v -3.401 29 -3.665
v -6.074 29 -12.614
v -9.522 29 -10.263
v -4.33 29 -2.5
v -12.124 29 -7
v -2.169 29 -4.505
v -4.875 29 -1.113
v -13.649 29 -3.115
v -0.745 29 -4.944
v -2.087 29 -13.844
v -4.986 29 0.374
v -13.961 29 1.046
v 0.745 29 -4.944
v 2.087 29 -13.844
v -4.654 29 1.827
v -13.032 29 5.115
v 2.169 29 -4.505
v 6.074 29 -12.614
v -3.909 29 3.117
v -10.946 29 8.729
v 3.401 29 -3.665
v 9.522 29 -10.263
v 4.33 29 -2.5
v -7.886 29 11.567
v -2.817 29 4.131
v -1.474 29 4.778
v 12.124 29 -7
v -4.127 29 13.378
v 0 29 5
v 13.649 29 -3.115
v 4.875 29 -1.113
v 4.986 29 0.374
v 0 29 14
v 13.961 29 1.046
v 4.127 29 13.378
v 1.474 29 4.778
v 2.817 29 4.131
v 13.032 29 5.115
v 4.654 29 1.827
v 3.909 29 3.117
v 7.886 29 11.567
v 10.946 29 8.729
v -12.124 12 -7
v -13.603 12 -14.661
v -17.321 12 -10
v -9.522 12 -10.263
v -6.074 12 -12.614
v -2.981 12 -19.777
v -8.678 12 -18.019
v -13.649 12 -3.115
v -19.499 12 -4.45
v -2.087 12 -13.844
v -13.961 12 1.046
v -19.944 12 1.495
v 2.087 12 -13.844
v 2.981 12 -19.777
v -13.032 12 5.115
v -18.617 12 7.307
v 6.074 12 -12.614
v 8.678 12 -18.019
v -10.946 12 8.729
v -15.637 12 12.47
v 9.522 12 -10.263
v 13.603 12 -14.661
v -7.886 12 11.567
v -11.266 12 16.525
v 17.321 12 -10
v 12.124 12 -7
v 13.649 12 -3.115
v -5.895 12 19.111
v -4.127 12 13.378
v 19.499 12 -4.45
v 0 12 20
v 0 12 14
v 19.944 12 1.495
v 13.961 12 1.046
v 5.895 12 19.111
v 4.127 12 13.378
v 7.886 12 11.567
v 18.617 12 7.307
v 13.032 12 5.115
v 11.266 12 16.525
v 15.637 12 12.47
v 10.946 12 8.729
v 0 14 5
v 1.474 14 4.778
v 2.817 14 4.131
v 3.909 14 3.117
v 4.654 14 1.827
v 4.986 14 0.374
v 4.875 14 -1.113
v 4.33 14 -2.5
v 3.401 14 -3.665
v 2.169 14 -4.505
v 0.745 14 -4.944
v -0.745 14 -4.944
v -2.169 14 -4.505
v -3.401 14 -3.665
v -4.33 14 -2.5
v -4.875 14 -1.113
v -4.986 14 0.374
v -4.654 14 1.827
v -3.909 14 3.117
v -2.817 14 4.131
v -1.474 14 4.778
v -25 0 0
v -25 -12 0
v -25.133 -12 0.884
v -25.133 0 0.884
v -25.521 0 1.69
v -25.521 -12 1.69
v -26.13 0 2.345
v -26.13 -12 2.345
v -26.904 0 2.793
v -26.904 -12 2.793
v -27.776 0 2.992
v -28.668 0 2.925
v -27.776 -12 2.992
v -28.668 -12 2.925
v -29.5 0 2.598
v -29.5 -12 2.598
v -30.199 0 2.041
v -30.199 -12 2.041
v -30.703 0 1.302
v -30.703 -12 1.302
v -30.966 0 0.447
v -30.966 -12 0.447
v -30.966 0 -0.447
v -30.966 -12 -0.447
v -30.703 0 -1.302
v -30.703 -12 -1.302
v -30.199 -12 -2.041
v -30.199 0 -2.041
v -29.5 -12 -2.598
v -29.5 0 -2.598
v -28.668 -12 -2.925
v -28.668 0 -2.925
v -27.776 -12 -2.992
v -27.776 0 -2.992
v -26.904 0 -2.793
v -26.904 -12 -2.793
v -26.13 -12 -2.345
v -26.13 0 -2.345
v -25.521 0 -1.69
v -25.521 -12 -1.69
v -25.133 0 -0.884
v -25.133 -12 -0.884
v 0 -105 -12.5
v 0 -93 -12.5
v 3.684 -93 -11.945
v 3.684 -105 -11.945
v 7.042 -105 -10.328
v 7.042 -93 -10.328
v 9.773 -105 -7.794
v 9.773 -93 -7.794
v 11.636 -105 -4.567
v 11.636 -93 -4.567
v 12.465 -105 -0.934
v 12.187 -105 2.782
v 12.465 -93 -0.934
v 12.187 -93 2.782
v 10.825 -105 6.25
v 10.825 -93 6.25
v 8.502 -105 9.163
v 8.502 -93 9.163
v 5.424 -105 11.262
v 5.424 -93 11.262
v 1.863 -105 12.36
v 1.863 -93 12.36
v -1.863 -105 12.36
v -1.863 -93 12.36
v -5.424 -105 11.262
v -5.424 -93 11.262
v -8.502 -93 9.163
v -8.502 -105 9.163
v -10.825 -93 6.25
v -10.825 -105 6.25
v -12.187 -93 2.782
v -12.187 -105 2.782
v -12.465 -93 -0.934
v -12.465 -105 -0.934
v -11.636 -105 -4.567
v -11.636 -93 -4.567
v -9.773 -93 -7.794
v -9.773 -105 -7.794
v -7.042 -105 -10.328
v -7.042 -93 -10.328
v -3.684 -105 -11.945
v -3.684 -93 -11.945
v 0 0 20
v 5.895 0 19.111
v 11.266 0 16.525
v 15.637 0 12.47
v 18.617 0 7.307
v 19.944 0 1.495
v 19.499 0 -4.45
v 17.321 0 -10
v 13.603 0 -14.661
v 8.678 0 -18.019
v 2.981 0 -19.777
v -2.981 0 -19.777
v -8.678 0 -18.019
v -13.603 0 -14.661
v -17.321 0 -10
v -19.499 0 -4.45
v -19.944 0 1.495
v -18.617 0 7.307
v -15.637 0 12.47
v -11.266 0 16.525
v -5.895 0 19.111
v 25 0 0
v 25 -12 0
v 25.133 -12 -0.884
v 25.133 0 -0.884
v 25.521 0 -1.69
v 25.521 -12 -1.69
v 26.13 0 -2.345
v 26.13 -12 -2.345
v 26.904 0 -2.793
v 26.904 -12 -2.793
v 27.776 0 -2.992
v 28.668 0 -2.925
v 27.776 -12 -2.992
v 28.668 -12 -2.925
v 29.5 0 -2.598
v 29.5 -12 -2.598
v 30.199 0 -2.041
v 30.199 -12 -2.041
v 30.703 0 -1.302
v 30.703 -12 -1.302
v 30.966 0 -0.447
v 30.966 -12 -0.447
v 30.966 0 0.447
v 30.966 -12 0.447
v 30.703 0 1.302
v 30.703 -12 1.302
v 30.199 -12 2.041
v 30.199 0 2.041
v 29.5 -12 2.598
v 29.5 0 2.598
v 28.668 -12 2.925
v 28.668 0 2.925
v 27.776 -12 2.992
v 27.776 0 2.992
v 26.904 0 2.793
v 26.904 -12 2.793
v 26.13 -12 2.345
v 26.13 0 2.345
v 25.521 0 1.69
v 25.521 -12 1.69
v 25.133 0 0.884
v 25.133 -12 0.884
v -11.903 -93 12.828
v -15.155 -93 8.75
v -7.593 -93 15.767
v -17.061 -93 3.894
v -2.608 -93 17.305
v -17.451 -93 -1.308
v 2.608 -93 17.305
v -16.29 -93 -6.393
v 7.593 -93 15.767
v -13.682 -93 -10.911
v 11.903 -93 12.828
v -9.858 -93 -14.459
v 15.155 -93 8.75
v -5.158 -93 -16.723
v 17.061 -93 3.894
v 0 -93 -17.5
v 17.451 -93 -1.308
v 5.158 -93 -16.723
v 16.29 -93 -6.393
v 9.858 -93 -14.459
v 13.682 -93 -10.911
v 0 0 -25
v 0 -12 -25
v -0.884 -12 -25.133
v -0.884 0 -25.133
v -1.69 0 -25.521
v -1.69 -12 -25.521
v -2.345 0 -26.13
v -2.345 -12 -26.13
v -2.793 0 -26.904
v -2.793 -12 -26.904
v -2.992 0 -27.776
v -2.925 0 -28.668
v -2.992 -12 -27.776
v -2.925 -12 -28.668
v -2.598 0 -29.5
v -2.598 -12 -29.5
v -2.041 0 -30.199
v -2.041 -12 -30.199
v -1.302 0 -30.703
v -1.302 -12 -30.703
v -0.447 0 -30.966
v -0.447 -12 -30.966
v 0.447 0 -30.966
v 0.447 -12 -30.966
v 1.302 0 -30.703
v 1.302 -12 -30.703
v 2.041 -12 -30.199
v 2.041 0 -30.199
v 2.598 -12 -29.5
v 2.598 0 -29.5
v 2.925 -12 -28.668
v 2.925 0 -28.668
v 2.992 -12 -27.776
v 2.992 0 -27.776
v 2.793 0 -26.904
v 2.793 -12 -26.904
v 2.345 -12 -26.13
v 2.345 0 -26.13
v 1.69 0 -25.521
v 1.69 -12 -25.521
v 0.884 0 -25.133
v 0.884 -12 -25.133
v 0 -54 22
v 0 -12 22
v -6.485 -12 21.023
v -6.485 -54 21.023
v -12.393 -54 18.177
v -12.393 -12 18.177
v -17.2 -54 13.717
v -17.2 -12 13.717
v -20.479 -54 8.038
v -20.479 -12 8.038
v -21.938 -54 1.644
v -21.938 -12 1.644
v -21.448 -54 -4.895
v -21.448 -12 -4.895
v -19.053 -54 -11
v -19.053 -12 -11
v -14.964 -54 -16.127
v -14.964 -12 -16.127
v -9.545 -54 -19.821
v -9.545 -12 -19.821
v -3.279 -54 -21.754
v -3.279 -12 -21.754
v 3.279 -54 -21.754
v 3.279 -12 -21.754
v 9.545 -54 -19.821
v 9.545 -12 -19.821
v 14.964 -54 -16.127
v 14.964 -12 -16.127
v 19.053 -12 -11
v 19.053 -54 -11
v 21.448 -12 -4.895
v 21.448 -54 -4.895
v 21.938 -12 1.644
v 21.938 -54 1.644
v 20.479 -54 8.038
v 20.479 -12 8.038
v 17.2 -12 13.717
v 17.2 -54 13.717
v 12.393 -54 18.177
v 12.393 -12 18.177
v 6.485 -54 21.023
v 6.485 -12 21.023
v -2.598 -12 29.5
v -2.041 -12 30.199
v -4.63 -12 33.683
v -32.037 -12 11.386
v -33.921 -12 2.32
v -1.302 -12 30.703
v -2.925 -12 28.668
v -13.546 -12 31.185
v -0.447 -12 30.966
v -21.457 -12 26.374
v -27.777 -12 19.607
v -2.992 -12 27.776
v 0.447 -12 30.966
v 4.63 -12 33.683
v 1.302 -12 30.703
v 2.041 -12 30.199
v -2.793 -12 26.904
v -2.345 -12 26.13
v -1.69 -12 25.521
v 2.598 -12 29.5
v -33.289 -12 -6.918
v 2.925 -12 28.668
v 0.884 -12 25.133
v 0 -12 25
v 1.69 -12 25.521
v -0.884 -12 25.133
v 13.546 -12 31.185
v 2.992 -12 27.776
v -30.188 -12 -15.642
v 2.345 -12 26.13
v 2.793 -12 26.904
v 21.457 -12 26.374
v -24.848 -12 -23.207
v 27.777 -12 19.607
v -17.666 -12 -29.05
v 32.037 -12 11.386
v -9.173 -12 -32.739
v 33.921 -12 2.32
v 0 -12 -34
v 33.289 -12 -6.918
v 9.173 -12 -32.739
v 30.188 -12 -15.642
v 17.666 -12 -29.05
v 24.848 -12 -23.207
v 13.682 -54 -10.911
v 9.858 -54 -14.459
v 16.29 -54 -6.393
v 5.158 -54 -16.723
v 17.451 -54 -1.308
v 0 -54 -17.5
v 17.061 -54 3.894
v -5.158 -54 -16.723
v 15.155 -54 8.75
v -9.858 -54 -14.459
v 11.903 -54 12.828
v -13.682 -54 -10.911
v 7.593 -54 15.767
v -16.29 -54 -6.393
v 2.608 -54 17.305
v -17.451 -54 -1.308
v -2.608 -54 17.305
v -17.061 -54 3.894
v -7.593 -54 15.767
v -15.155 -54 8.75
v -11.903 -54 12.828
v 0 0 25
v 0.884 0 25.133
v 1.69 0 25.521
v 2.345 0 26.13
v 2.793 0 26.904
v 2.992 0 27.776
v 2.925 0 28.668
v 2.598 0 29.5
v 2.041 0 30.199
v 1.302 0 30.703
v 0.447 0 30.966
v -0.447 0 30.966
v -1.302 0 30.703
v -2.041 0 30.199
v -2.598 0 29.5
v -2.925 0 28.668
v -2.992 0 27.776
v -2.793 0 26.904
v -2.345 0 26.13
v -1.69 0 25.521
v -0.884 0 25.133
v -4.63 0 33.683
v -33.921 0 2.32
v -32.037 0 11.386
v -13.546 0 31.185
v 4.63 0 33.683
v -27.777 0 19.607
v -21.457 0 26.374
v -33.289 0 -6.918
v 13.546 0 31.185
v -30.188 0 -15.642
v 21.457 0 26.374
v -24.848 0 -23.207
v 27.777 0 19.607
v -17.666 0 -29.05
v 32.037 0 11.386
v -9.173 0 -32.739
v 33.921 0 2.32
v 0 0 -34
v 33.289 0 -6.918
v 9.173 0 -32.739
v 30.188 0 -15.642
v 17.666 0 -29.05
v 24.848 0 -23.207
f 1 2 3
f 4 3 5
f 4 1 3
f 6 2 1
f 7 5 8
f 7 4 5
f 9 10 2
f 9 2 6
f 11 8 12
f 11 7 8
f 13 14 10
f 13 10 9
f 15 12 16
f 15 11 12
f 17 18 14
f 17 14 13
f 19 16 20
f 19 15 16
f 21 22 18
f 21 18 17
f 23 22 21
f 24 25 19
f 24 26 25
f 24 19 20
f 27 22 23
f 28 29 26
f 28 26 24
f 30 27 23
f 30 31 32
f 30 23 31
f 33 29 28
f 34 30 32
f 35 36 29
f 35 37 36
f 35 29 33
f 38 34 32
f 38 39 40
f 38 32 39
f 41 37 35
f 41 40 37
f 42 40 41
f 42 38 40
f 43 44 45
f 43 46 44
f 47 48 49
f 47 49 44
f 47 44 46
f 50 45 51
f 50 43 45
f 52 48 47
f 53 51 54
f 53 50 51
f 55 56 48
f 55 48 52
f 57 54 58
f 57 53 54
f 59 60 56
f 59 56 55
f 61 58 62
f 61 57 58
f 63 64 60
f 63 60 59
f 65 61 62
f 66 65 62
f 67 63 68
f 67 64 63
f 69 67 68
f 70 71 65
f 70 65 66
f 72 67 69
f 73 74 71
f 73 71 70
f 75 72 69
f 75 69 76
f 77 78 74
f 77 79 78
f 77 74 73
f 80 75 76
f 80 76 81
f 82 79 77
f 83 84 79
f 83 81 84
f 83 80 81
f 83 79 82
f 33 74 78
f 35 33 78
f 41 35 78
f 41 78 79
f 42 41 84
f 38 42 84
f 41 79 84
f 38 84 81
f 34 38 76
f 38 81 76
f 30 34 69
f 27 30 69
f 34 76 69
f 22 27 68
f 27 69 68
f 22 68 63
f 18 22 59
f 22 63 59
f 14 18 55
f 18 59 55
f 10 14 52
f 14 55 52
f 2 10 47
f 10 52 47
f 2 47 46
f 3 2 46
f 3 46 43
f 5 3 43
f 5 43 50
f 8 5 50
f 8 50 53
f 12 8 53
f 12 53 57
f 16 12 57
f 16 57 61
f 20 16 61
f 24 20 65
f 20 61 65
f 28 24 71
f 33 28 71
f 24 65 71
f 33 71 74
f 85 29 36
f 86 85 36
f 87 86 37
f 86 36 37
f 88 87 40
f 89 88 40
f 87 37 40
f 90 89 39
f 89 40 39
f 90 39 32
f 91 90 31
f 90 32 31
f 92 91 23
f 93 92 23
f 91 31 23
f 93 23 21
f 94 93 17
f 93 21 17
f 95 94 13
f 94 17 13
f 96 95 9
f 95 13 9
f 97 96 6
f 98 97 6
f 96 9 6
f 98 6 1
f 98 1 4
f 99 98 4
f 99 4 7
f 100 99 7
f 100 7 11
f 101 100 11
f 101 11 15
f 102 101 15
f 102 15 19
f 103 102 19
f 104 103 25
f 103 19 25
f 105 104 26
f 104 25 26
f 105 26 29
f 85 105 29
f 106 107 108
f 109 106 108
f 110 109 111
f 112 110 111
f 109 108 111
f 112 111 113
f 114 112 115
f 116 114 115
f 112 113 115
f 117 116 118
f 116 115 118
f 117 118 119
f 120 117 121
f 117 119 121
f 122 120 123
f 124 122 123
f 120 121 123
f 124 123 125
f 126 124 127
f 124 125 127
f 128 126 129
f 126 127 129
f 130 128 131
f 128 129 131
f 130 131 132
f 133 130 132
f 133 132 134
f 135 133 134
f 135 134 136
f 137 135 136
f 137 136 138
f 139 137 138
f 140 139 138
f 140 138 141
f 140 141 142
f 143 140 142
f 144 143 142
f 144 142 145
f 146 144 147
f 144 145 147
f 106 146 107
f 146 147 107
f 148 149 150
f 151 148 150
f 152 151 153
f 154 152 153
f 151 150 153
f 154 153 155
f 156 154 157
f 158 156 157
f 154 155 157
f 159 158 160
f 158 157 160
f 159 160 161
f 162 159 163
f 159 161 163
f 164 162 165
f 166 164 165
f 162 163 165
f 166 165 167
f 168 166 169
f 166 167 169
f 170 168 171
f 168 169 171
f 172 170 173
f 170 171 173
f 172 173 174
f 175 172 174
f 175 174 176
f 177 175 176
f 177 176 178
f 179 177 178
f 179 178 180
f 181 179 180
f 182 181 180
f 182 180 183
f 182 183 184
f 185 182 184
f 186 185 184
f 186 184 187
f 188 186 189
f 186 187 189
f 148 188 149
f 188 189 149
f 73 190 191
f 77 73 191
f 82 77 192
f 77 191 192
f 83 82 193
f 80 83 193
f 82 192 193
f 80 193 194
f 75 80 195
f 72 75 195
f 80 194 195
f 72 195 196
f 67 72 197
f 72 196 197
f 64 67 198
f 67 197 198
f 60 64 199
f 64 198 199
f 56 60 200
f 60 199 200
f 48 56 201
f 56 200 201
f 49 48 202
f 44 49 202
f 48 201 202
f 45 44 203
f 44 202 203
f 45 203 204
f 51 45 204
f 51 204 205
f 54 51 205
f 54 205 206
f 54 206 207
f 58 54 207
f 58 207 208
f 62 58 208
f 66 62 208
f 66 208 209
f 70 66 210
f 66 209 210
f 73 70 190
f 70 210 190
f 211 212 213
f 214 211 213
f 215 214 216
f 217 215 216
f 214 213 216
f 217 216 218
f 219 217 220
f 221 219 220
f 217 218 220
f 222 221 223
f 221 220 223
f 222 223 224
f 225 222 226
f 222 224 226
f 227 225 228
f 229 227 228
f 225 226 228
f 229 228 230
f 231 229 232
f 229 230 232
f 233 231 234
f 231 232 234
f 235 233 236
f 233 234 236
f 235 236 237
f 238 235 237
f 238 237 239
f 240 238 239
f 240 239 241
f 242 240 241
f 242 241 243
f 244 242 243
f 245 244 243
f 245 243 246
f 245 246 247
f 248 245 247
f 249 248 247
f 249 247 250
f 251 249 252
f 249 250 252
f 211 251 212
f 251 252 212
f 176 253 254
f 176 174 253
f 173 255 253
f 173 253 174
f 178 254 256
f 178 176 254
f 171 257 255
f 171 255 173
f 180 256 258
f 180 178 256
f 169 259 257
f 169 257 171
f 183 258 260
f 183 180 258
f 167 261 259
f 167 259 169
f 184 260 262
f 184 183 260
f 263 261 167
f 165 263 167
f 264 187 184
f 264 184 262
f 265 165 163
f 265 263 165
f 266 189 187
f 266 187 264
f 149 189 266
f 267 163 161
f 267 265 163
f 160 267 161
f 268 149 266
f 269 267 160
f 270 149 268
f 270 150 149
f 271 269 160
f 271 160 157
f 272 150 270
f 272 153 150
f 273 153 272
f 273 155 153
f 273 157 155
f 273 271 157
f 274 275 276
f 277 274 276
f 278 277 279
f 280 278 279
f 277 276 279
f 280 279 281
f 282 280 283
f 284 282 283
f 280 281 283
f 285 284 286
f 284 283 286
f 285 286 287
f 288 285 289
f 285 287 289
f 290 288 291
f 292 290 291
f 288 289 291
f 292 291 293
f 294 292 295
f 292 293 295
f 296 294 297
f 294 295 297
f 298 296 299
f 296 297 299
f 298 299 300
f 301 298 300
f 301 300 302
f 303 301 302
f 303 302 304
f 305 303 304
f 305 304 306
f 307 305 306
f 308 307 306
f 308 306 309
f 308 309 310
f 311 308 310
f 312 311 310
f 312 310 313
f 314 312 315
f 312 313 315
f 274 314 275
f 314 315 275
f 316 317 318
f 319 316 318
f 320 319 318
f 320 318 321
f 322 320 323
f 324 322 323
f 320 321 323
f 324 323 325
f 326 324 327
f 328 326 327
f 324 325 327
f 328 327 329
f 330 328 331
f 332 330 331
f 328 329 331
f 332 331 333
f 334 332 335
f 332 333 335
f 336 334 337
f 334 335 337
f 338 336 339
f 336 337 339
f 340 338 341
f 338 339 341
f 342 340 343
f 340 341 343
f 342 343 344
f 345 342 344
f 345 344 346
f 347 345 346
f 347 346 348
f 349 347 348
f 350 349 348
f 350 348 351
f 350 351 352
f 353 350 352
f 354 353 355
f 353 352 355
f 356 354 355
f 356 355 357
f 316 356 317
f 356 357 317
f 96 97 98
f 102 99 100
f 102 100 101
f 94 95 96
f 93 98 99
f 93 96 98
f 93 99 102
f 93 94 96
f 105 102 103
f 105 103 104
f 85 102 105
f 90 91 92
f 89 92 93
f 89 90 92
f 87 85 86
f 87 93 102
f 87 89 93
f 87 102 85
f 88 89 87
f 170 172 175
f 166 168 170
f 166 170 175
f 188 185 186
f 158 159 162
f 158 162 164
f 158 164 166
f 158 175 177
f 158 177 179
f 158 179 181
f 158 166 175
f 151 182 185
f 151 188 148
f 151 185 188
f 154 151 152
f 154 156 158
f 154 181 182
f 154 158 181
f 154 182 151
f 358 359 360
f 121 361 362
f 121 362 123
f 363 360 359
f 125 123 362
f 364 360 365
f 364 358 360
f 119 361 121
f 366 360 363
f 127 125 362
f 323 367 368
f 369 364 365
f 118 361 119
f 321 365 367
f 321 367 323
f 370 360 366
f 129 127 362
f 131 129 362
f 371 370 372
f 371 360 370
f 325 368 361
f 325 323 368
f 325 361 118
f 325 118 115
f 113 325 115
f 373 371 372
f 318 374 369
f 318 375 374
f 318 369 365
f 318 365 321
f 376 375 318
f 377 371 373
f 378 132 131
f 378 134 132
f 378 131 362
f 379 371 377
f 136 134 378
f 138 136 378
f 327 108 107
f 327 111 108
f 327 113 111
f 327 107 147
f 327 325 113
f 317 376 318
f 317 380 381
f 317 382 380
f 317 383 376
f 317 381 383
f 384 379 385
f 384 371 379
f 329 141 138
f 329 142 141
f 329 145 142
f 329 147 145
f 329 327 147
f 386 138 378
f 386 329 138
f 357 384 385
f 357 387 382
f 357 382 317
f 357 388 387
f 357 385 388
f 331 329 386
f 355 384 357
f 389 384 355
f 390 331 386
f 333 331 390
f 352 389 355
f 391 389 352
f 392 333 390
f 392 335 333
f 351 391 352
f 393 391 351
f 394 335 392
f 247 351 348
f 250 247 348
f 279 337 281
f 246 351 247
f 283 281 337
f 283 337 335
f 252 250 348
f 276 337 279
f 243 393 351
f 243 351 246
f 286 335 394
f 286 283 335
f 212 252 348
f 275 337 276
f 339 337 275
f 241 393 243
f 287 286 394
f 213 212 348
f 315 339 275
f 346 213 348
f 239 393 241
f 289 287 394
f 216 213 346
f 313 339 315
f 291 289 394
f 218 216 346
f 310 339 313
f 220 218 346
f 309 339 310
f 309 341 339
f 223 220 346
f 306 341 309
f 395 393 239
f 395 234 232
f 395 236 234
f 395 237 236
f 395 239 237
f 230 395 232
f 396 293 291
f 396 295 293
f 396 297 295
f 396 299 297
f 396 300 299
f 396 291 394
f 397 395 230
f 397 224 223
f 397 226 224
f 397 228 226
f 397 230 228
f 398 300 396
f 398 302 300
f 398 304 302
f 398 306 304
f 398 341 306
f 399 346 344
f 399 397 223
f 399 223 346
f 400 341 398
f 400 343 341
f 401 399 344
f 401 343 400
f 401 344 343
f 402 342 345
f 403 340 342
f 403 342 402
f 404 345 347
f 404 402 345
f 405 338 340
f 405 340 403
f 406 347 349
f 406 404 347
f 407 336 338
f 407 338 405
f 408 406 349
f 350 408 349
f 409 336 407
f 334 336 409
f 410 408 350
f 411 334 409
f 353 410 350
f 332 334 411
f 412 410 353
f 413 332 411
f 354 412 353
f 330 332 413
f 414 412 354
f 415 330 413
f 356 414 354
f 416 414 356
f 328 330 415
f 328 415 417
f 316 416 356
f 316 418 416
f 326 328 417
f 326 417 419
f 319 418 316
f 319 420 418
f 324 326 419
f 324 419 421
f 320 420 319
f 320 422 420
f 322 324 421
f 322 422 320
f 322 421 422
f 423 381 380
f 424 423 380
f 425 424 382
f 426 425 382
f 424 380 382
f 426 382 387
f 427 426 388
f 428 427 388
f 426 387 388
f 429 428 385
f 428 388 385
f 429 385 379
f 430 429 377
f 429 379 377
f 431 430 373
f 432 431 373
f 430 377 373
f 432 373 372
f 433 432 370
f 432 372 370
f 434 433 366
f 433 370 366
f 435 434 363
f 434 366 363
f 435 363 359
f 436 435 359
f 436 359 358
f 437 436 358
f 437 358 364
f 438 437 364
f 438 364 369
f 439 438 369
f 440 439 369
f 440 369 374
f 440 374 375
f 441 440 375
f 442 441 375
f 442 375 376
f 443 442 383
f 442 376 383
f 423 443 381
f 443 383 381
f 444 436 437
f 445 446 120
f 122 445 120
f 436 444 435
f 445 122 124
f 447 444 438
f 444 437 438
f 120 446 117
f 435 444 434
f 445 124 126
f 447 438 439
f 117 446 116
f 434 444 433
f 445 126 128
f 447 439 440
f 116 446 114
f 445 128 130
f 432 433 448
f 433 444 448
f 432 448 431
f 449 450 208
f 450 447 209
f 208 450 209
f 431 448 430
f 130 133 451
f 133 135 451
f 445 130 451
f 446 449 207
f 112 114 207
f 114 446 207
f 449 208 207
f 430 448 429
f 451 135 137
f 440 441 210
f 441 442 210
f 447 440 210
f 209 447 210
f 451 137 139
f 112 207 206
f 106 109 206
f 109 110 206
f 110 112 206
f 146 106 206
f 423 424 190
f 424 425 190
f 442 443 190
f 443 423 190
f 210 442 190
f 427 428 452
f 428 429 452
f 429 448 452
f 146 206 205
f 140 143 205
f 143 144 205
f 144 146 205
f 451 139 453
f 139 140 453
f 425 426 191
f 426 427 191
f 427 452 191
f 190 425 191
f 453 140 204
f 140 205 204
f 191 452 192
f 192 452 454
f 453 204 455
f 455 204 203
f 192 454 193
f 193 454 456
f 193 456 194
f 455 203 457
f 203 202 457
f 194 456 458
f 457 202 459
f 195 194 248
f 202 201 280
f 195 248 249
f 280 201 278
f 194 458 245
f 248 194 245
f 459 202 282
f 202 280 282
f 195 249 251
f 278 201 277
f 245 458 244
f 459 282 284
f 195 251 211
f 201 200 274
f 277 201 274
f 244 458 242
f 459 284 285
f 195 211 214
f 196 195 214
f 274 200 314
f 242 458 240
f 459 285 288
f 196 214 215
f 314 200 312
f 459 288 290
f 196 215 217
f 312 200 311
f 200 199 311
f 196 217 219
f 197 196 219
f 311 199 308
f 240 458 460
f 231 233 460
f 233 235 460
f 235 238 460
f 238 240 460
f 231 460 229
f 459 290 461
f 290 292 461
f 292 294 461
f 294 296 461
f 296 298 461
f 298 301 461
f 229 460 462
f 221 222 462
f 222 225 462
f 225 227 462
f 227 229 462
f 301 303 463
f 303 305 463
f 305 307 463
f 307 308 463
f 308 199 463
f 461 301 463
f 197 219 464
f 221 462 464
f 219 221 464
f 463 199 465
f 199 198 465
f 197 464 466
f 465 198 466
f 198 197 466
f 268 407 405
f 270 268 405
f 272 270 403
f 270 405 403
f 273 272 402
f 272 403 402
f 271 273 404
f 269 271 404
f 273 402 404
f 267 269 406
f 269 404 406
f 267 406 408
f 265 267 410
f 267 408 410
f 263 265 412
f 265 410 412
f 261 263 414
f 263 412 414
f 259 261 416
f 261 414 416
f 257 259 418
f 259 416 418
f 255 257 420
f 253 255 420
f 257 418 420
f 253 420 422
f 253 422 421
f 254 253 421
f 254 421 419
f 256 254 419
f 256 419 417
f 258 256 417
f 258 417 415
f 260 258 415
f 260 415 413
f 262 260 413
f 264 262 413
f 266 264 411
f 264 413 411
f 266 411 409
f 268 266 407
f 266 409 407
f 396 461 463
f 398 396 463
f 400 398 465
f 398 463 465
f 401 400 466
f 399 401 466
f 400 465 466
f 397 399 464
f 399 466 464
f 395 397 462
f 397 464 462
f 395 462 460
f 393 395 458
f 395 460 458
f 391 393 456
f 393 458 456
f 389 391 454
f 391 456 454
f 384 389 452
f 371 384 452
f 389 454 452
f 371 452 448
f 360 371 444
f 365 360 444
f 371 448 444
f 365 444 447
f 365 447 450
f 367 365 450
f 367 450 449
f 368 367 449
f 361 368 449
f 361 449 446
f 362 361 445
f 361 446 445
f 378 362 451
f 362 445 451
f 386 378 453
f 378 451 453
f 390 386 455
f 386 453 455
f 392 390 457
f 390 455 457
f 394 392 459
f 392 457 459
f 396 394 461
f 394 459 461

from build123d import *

# Parameters (mm, degrees)
SKETCH_1_R               = 20
EXTRUDE_1_DEPTH          = 12
SKETCH_3_R               = 34
EXTRUDE_2_DEPTH          = 12
SKETCH_4_R               = 22
EXTRUDE_3_DEPTH          = 42
SKETCH_5_R               = 17.5
EXTRUDE_5_DEPTH          = 39
SKETCH_6_R               = 12.5
EXTRUDE_6_DEPTH          = 12
SKETCH_8_R               = 16
SKETCH_8_R_2             = 10
EXTRUDE_7_DEPTH          = 18
SKETCH_11_R              = 3
CUT_EXTRUDE_9_DEPTH      = 12
PATTERN_CIRCULAR_1_COUNT = 4
SKETCH_12_R              = 14
EXTRUDE_8_DEPTH          = 17
SKETCH_14_R              = 5
CUT_EXTRUDE_10_DEPTH     = 15


with BuildPart() as part:
    # 草图1 → 凸台-拉伸1 (new body)
    with BuildSketch(Plane(origin=(0, 0, 0), x_dir=(1, 0, 0), z_dir=(0, 1, 0))):
        with Locations(Location((0, 0, 0), (0, 0, 270))):
            Circle(SKETCH_1_R)
    extrude(amount=EXTRUDE_1_DEPTH)

    # 草图3 → 凸台-拉伸2 (add)
    with BuildSketch(Plane.XZ):
        with Locations(Location((0, 0, 0), (0, 0, 270))):
            Circle(SKETCH_3_R)
    extrude(amount=EXTRUDE_2_DEPTH)

    # 草图4 → 凸台-拉伸3 (add)
    with BuildSketch(Plane.XZ.offset(12)):
        with Locations(Location((0, 0, 0), (0, 0, 90))):
            Circle(SKETCH_4_R)
    extrude(amount=EXTRUDE_3_DEPTH)

    # 草图5 → 凸台-拉伸5 (add)
    with BuildSketch(Plane.XZ.offset(54)):
        with Locations(Location((0, 0, 0), (0, 0, 270))):
            Circle(SKETCH_5_R)
    extrude(amount=EXTRUDE_5_DEPTH)

    # 草图6 → 凸台-拉伸6 (add)
    with BuildSketch(Plane.XZ.offset(93)):
        with Locations(Location((0, 0, 0), (0, 0, 270))):
            Circle(SKETCH_6_R)
    extrude(amount=EXTRUDE_6_DEPTH)

    # 草图8 → 凸台-拉伸7 (add)
    with BuildSketch(Plane.XZ.offset(12)):
        Circle(SKETCH_8_R)
        Circle(SKETCH_8_R_2, mode=Mode.SUBTRACT)
    extrude(amount=EXTRUDE_7_DEPTH)

    # 草图11 → 切除-拉伸9 (cut)
    with BuildSketch(Plane.XZ.offset(12)):
        with Locations(Location((0, 28, 0), (0, 0, 270))):
            Circle(SKETCH_11_R)
    cut_extrude_9 = extrude(amount=-CUT_EXTRUDE_9_DEPTH, mode=Mode.SUBTRACT)

    # 阵列(圆周)1: 切除-拉伸9 ×4 about axis
    pattern_circular_1_axis = Axis((0, 0, 0), (0, 1, 0))
    for i in range(1, PATTERN_CIRCULAR_1_COUNT):
        add(cut_extrude_9.rotate(pattern_circular_1_axis, i * 360 / PATTERN_CIRCULAR_1_COUNT), mode=Mode.SUBTRACT)

    # 草图12 → 凸台-拉伸8 (add)
    with BuildSketch(Plane(origin=(0, 12, 0), x_dir=(1, 0, 0), z_dir=(0, 1, 0))):
        with Locations(Location((0, 0, 0), (0, 0, 270))):
            Circle(SKETCH_12_R)
    extrude(amount=EXTRUDE_8_DEPTH)

    # 草图14 → 切除-拉伸10 (cut)
    with BuildSketch(Plane(origin=(0, 29, 0), x_dir=(1, 0, 0), z_dir=(0, 1, 0))):
        with Locations(Location((0, 0, 0), (0, 0, 270))):
            Circle(SKETCH_14_R)
    extrude(amount=-CUT_EXTRUDE_10_DEPTH, mode=Mode.SUBTRACT)


solid = part.part
